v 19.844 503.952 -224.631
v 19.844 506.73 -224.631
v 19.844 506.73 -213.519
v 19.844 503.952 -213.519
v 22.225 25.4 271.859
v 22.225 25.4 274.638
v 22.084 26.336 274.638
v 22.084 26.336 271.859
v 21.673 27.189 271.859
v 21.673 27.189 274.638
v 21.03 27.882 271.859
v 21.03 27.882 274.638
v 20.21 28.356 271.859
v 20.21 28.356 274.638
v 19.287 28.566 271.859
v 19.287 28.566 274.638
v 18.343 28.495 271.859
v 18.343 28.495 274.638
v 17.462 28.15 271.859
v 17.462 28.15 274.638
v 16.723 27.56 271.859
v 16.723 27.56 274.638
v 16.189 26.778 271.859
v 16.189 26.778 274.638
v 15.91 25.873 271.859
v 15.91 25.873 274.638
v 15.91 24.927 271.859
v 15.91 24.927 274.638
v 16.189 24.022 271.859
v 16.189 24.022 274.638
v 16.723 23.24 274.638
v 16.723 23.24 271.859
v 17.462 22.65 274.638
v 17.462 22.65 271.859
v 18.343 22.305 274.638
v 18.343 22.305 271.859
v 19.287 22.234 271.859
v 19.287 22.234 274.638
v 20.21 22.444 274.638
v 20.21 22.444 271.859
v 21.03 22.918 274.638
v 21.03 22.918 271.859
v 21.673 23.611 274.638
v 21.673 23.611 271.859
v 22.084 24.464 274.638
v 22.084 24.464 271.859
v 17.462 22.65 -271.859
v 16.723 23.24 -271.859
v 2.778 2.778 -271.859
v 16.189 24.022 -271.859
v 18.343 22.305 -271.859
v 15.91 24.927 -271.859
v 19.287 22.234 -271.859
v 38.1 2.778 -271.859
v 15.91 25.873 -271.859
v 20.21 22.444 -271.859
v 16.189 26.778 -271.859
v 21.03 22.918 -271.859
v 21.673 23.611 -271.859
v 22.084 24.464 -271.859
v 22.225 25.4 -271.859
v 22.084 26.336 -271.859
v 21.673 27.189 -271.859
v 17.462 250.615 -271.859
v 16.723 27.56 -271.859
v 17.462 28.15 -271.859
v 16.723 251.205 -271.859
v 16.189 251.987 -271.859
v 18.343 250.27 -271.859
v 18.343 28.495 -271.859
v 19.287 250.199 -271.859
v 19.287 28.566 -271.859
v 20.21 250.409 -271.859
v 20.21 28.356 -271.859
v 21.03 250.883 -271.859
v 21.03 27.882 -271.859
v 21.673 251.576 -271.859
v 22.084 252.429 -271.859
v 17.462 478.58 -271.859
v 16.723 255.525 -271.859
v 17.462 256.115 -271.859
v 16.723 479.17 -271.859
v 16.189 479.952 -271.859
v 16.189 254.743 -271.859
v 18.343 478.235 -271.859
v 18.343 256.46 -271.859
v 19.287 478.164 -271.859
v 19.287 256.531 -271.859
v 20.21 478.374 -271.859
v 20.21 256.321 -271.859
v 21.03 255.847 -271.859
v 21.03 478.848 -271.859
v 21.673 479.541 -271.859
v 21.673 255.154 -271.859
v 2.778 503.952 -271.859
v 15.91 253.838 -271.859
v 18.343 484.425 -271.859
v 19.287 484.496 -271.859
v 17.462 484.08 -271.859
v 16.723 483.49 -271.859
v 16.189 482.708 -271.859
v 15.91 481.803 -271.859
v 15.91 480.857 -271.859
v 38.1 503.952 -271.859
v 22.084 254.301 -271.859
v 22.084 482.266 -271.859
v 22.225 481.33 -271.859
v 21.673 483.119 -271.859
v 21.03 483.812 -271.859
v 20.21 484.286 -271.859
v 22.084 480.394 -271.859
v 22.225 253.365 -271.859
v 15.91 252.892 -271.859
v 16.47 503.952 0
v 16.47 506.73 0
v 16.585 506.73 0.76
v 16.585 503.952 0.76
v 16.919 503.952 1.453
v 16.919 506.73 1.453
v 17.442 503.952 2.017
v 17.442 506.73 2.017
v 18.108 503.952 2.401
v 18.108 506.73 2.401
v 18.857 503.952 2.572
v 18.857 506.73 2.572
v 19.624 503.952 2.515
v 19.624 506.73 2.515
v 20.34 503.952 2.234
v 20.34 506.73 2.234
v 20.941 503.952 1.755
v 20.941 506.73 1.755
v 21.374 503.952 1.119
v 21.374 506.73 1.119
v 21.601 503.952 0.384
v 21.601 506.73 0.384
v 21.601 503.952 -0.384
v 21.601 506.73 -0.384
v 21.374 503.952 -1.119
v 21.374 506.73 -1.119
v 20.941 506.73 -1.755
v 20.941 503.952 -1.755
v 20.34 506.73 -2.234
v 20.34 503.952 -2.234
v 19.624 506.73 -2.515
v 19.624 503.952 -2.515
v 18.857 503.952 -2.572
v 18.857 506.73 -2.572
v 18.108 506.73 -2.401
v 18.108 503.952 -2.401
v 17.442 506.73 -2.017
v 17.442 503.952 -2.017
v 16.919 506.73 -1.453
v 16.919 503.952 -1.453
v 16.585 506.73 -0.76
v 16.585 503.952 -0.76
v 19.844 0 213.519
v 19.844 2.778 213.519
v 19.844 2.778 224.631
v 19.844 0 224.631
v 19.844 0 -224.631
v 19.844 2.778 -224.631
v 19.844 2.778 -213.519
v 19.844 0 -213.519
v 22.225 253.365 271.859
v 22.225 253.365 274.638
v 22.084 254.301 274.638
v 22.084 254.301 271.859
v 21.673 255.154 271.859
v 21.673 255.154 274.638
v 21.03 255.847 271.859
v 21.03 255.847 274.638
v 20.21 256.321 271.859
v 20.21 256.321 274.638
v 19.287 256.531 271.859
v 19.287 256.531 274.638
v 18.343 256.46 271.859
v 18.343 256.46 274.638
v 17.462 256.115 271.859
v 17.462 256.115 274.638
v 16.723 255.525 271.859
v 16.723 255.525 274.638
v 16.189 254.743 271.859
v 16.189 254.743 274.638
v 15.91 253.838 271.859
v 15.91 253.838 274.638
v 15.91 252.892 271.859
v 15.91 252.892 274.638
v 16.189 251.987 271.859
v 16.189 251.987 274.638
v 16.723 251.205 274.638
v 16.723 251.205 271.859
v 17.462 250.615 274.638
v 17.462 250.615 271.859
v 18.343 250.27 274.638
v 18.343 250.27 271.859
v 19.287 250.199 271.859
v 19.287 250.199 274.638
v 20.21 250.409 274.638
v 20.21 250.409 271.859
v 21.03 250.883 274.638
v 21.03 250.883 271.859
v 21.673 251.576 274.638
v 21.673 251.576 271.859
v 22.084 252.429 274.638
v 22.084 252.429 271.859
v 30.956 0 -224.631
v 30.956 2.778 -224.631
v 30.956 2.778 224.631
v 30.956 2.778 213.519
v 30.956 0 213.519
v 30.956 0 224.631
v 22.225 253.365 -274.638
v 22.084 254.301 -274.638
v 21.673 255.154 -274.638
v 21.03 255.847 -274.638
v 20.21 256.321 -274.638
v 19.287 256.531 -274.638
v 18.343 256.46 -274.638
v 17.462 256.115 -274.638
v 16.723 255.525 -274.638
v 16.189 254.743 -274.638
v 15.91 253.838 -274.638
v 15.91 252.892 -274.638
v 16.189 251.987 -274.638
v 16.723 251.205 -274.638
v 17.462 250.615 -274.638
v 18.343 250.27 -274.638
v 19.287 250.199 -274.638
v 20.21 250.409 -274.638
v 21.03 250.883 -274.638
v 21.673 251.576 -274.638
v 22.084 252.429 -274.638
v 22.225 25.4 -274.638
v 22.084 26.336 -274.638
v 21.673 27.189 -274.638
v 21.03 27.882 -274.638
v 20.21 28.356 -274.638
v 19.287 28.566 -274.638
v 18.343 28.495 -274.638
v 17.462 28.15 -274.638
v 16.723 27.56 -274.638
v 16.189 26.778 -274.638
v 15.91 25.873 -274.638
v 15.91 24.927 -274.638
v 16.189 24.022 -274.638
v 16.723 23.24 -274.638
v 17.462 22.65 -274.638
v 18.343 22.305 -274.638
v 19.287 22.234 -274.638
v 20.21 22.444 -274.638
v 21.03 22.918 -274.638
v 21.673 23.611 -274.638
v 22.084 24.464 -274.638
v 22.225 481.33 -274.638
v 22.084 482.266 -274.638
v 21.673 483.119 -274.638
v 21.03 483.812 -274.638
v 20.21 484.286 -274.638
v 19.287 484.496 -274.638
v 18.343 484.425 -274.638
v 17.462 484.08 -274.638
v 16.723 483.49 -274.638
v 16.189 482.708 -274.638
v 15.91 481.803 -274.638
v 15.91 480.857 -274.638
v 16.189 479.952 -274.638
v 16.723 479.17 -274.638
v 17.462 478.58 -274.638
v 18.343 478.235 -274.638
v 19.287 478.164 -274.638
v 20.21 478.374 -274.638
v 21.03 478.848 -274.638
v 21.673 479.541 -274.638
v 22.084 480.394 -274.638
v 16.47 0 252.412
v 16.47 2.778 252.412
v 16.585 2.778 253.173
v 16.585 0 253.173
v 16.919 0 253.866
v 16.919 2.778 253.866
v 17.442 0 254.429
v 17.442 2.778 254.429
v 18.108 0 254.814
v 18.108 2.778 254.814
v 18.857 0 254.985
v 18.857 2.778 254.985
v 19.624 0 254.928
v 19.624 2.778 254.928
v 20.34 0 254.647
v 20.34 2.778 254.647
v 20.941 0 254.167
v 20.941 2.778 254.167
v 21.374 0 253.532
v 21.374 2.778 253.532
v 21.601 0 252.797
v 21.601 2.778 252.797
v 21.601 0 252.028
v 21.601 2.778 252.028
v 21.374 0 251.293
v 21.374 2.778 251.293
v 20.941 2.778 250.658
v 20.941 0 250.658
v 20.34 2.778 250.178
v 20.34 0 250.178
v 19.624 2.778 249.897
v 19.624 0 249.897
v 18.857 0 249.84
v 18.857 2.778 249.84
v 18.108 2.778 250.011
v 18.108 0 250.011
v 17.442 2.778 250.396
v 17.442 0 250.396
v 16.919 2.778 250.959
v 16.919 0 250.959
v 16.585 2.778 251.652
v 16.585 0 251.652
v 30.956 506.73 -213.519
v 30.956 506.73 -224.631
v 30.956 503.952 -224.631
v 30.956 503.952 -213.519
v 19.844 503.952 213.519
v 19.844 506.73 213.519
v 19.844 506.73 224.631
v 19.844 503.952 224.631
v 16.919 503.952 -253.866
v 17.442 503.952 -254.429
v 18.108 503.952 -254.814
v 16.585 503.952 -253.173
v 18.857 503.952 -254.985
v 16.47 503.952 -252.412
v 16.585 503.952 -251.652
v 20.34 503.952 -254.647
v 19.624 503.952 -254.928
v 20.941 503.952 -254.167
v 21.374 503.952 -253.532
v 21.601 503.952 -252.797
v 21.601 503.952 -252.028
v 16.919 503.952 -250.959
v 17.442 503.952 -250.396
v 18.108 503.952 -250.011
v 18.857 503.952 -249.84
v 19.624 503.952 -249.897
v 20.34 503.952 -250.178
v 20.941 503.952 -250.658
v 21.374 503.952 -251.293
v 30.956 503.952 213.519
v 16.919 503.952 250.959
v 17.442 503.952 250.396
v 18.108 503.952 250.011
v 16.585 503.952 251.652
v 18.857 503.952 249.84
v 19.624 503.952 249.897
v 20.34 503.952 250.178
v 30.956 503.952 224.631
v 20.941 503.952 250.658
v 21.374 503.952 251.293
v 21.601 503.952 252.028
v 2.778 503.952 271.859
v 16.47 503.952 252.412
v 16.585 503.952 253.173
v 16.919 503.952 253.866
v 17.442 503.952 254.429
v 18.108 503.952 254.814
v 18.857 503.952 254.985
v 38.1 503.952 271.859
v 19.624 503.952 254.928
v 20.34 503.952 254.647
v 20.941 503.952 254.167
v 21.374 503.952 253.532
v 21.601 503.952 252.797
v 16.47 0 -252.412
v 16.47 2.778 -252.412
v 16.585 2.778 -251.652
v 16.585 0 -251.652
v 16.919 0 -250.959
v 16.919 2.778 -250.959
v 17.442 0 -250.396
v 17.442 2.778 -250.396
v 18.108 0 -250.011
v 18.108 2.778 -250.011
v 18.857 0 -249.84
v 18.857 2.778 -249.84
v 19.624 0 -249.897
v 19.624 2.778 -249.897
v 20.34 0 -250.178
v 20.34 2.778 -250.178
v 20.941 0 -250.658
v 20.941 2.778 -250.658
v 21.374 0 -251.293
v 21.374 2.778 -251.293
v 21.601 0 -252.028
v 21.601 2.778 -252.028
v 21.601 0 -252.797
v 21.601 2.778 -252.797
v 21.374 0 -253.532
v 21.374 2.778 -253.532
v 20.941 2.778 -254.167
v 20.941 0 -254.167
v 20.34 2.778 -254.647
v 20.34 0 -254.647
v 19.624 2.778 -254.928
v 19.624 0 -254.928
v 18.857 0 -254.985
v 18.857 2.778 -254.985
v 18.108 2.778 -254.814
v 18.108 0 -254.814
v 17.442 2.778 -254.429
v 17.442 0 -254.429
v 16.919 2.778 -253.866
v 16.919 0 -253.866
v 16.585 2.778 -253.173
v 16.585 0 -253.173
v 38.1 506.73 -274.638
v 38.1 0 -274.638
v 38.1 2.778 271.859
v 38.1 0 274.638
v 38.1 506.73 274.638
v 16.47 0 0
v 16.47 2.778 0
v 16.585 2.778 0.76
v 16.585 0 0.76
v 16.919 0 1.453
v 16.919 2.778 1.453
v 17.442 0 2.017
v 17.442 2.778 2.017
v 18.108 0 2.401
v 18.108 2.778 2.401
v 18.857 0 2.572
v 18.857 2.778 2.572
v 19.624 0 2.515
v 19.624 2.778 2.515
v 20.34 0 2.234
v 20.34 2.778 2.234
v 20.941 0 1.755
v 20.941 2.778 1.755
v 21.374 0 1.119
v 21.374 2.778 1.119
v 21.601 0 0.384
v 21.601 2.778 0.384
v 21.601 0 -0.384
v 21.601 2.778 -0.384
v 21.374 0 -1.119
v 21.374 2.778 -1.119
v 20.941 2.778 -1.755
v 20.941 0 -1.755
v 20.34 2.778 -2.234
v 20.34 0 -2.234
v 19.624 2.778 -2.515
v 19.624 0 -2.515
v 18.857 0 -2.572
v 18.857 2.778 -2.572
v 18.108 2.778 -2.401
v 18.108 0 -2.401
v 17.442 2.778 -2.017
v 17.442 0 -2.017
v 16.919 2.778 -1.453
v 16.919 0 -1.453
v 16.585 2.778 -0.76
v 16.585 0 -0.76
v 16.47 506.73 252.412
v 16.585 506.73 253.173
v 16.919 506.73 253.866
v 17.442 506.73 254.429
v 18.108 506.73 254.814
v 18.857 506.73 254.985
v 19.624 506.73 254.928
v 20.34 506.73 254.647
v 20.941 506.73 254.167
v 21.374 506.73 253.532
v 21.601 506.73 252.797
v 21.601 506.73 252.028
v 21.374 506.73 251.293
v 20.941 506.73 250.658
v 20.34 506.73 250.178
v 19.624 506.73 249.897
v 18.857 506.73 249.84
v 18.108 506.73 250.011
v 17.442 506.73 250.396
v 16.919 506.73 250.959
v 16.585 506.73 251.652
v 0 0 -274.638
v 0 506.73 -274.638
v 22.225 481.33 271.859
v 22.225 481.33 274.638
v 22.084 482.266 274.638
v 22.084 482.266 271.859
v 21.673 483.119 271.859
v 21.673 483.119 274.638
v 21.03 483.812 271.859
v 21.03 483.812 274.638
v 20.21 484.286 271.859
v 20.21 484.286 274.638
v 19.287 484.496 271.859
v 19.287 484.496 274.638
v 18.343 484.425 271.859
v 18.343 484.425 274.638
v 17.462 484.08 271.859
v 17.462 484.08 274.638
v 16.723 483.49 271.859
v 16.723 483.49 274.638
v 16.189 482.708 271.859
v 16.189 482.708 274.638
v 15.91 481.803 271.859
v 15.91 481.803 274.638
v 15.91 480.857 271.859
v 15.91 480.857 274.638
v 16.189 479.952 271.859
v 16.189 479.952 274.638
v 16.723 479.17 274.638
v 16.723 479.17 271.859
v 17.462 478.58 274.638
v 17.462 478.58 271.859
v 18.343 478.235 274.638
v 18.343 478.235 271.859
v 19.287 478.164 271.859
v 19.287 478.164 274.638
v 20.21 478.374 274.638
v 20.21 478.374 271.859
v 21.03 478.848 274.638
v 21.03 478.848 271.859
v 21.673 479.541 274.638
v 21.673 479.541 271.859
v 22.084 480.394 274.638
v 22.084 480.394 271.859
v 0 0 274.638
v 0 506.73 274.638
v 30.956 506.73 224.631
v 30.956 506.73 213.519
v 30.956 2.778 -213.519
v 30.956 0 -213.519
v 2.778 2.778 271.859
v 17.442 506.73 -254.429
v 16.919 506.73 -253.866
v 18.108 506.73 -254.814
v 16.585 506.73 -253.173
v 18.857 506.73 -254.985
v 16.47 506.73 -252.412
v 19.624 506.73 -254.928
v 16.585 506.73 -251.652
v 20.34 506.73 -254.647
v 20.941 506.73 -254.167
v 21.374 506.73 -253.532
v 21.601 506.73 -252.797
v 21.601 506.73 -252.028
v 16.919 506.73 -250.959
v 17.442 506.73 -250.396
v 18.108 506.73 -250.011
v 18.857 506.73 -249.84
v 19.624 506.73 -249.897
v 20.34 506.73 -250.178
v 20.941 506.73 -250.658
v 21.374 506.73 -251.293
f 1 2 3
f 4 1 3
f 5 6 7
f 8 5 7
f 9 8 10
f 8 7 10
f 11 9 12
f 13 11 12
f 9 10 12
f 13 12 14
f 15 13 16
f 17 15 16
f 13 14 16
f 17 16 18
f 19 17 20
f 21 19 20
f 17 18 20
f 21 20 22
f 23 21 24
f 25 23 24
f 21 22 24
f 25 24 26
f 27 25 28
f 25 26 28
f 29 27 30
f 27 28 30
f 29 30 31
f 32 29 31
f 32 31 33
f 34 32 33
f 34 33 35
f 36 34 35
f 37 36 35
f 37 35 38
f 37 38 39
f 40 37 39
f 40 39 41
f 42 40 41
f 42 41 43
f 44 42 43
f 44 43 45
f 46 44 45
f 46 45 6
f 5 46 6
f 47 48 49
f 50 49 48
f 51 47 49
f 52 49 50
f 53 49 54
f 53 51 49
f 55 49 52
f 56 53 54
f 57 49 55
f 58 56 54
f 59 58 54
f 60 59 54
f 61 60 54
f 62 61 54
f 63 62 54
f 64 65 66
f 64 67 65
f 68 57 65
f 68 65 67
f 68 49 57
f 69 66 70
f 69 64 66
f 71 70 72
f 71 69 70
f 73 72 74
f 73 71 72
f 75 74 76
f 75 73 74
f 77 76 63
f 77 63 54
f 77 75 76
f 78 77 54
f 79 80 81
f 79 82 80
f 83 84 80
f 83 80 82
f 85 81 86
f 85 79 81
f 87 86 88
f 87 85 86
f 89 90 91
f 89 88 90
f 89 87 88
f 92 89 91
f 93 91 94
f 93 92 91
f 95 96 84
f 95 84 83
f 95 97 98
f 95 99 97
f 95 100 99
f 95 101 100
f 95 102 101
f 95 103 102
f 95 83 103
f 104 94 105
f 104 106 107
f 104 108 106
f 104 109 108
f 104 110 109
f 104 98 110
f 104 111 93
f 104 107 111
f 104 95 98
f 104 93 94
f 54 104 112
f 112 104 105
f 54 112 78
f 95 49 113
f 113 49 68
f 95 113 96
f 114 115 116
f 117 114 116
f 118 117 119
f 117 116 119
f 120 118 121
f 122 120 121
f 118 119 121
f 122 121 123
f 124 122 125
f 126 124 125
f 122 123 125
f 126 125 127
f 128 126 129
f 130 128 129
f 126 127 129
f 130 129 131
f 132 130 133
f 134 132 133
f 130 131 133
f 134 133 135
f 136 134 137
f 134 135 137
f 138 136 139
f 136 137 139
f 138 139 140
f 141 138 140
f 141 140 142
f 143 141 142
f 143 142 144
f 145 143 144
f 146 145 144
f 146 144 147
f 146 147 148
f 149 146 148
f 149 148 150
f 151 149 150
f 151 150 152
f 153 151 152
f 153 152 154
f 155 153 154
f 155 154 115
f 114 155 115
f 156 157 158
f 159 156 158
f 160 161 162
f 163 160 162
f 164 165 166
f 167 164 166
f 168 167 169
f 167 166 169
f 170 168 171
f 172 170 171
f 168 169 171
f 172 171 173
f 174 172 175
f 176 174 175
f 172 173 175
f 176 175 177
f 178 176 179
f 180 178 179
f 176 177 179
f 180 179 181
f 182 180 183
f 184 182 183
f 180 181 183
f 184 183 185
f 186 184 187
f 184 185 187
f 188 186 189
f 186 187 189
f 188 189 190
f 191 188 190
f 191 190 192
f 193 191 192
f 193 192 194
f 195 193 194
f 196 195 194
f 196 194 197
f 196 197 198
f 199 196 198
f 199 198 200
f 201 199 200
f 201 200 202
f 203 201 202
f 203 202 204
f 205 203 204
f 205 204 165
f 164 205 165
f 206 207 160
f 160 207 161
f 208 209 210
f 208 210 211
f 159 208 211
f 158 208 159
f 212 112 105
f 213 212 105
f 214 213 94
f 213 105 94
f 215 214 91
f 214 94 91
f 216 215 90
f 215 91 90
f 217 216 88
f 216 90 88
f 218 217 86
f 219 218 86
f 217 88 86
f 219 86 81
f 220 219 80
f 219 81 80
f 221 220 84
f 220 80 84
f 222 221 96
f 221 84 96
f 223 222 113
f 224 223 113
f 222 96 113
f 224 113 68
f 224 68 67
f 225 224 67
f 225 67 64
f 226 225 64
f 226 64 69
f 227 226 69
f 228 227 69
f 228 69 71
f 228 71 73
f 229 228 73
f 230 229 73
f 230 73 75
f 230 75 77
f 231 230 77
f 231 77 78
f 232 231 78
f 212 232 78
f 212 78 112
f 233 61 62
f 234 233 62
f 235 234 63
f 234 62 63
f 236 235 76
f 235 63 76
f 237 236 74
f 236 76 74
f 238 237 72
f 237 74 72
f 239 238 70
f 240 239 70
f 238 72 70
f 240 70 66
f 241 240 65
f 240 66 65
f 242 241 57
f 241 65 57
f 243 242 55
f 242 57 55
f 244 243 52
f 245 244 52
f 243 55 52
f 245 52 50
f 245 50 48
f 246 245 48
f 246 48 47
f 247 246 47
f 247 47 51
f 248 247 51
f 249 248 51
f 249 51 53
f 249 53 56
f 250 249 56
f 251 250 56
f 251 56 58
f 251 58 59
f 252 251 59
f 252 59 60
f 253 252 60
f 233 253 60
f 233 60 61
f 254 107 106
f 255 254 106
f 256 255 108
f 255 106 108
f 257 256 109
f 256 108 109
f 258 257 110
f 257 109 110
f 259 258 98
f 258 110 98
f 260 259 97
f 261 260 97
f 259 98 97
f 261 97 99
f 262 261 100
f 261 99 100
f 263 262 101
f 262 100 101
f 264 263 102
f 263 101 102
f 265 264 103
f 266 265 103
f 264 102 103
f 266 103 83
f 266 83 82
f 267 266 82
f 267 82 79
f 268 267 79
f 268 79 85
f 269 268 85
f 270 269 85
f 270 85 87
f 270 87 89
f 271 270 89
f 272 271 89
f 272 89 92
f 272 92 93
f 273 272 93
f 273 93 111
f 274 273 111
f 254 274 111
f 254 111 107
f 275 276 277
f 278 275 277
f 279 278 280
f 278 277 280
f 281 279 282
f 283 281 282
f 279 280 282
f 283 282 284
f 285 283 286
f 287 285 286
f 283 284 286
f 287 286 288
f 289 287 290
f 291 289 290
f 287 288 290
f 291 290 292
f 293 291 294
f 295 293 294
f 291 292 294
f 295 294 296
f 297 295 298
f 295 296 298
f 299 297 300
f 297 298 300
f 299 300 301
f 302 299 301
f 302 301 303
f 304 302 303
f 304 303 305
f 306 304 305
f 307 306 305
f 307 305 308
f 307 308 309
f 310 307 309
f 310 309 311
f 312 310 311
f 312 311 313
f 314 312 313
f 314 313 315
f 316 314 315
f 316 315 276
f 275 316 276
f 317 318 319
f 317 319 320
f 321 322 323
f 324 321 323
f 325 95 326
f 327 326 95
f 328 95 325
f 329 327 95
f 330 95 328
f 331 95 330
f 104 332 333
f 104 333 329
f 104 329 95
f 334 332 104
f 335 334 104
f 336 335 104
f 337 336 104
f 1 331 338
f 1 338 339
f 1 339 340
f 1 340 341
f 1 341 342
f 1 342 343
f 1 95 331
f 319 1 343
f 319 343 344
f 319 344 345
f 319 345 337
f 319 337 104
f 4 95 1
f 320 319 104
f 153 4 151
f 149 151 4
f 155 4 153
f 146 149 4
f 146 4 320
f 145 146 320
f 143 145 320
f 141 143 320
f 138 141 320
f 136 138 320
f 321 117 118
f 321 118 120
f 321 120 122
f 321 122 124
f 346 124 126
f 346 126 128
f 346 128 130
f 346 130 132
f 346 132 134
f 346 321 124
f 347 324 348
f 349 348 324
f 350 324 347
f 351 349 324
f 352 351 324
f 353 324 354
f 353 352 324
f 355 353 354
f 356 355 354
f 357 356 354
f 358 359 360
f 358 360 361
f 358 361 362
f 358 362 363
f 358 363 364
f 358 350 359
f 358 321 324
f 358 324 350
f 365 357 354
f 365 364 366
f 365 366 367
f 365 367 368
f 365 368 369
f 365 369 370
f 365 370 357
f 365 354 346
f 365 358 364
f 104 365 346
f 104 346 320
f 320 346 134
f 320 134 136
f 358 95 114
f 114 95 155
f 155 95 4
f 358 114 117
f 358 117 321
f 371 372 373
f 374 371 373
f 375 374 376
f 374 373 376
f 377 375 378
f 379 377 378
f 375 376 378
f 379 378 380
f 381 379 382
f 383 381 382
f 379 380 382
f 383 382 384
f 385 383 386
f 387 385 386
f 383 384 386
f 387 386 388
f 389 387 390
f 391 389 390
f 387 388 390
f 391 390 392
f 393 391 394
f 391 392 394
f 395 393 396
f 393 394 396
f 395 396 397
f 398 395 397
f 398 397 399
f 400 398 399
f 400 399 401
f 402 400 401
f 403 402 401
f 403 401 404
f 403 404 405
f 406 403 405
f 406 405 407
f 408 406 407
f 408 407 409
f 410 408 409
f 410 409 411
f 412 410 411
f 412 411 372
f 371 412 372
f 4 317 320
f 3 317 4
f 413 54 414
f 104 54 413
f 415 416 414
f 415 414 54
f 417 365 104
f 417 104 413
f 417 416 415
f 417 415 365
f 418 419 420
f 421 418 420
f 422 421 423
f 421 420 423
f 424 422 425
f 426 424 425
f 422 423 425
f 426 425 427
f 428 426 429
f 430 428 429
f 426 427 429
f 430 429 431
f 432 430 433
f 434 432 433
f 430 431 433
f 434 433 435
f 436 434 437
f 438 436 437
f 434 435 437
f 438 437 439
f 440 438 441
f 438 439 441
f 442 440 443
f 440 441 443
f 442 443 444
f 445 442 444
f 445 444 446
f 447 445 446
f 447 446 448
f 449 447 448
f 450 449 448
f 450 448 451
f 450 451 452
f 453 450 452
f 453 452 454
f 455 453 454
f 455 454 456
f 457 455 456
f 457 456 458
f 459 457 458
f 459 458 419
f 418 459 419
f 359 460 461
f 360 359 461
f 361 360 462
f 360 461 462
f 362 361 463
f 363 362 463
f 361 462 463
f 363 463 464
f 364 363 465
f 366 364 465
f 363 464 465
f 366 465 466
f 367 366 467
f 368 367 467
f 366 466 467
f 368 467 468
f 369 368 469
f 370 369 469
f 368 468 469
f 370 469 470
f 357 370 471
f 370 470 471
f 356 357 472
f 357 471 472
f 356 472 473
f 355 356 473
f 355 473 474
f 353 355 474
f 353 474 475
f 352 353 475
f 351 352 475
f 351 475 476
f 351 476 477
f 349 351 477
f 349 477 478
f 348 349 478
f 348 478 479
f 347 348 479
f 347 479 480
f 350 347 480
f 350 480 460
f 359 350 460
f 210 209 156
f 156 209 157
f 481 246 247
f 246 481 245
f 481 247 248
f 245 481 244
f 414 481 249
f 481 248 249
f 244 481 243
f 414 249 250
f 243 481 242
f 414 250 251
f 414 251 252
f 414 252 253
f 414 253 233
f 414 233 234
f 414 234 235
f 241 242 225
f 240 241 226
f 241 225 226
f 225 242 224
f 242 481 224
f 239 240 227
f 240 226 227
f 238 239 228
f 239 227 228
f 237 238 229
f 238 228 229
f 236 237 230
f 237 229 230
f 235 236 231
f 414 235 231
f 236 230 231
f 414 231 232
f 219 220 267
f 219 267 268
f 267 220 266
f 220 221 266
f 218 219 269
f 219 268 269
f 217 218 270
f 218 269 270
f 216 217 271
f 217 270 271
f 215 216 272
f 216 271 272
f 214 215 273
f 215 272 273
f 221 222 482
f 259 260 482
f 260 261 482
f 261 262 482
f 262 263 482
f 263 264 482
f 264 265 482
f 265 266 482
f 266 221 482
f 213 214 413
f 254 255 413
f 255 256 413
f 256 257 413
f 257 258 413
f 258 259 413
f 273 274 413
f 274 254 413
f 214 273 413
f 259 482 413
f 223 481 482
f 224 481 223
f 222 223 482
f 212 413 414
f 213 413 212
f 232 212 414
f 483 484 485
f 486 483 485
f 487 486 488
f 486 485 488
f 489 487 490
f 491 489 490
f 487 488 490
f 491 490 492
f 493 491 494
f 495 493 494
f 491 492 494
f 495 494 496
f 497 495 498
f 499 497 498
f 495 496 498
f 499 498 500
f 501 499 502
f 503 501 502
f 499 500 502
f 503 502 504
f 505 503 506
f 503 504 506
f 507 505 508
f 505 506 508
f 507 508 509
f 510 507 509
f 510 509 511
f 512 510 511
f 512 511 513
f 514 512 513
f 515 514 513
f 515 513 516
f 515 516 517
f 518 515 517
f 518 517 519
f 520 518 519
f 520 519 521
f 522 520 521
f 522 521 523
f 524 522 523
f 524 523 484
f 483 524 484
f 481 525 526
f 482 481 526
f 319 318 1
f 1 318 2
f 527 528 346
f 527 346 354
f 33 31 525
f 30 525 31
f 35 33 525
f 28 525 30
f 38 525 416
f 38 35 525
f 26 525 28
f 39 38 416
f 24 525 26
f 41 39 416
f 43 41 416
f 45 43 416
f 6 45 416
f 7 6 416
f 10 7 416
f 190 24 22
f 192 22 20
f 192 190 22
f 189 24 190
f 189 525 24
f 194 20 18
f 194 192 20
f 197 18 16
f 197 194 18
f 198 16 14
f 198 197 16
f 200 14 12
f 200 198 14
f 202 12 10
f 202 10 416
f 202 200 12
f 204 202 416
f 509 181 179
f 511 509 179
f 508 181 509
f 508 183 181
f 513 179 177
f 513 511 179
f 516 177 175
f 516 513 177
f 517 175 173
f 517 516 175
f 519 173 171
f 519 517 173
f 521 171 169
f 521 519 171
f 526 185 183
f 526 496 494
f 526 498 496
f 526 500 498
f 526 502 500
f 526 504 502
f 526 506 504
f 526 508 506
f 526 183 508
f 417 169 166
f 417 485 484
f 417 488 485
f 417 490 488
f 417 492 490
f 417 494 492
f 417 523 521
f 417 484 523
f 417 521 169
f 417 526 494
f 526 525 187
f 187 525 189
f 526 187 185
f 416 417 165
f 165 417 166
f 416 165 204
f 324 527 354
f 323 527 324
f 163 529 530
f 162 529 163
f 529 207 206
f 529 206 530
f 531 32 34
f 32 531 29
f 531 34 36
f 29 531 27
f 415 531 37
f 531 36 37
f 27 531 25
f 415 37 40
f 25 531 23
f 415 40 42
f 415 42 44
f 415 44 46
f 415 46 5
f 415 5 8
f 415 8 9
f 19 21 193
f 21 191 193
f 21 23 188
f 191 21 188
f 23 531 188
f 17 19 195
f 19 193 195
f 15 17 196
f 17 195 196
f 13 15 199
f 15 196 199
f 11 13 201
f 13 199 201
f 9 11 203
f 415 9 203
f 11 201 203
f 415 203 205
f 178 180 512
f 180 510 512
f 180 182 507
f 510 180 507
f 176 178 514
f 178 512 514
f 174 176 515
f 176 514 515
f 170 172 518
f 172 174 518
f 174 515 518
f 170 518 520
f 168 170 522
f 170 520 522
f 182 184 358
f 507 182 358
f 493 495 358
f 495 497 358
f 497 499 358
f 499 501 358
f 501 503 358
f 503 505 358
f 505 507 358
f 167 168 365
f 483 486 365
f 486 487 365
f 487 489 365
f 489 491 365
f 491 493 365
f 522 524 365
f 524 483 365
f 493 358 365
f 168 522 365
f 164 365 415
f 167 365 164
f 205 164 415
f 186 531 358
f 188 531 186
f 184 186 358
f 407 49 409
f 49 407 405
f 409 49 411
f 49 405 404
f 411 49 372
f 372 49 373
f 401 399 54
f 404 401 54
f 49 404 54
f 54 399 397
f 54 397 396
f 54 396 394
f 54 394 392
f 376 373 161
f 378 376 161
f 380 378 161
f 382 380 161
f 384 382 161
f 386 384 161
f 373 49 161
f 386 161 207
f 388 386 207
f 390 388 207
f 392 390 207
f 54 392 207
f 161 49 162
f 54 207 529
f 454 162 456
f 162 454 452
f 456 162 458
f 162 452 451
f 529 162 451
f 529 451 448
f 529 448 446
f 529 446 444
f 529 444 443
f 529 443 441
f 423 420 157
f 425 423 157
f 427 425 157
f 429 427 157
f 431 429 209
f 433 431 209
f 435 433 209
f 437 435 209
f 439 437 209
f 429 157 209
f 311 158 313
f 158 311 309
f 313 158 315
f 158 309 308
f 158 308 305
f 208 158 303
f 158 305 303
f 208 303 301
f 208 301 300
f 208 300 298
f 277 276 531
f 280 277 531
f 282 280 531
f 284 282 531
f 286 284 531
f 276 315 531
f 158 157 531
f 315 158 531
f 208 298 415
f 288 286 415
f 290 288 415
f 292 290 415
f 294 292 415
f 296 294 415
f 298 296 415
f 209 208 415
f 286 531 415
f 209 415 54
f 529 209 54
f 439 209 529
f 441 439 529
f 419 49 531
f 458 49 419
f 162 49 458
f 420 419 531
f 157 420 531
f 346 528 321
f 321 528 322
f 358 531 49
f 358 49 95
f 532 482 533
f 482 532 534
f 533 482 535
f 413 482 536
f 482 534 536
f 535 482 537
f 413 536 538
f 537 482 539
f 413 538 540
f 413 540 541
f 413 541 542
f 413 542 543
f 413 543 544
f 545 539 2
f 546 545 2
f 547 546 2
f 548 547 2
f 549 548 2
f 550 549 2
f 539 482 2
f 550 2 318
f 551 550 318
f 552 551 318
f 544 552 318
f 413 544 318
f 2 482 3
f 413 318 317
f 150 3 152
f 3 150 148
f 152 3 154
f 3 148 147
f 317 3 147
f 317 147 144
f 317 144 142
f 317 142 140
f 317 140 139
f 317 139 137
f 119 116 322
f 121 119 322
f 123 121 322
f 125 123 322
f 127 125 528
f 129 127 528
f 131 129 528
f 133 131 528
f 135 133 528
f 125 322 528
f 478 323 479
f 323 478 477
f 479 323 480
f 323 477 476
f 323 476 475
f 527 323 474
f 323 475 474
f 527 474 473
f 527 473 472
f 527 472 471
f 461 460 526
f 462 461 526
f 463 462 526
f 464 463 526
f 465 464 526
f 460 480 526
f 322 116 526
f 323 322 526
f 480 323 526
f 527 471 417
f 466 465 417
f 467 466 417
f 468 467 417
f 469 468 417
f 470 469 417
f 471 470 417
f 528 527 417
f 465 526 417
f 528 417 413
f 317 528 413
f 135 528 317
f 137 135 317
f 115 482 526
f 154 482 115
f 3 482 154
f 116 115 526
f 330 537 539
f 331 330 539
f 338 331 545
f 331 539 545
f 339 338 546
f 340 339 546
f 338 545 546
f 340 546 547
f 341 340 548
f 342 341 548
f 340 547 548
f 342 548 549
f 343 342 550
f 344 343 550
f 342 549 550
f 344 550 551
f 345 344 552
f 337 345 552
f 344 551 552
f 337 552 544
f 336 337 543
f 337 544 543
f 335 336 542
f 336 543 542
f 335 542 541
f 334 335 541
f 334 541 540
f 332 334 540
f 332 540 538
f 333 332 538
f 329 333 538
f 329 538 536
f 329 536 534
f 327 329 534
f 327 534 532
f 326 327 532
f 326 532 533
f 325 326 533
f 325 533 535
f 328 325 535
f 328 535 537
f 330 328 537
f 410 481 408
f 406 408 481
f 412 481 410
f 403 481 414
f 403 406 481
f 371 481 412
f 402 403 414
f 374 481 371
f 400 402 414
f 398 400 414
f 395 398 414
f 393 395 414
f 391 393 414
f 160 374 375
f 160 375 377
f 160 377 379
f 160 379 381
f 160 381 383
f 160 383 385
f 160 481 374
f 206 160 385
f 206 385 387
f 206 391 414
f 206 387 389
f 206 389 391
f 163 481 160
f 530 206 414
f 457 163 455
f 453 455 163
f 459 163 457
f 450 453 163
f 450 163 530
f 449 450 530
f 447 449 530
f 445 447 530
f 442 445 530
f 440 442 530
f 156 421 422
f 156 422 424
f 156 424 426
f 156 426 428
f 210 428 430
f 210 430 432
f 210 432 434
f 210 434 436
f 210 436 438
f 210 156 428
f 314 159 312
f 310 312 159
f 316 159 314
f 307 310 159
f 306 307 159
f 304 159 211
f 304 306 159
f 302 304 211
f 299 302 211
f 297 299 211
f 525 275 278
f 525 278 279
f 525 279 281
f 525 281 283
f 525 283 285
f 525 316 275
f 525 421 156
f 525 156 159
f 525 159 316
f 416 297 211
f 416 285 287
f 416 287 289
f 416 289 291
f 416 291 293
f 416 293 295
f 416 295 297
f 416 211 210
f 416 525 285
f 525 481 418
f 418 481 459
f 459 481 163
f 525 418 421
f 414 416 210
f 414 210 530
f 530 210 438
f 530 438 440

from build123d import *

# Parameters (mm, degrees)
F0_W     = 38.1
F0_H     = 506.73
F1_DEPTH = 274.6375
F2_T     = -2.778125
F3_R     = 2.5796875
F3_W     = 11.1125
F3_H     = 11.1125
F4_DEPTH = 506.731
F5_R     = 3.175
F6_DEPTH = 549.276


# Not quite as in the source:
# - a feature names something its author has since deleted; it is built from what else it names


with BuildPart() as f1:
    # F0 (on Top) → F1 (new body, symmetric)
    with BuildSketch(Plane.XY):
        with Locations((19.05, 253.365)):
            Rectangle(F0_W, F0_H)
    extrude(amount=F1_DEPTH, both=True)

    # F2
    f2_openings = [f1.faces().sort_by_distance(p)[0] for p in [
        (38.1, 253.365, 0),
    ]]
    offset(amount=F2_T, openings=f2_openings)

    # F3 (on face) → F4 (cut, through all)
    with BuildSketch(Plane(origin=(0, 506.73, 0), x_dir=(-1, 0, 0), z_dir=(0, 1, 0))):
        with Locations((-19.05, 252.4125)):
            Circle(F3_R)
        with Locations((-19.05, 0)):
            Circle(F3_R)
        with Locations((-19.05, -252.4125)):
            Circle(F3_R)
        with Locations((-25.4, 219.075)):
            Rectangle(F3_W, F3_H)
        with Locations((-25.4, -219.075)):
            Rectangle(F3_W, F3_H)
    extrude(amount=-F4_DEPTH, mode=Mode.SUBTRACT)

    # F5 (on face) → F6 (cut, through all)
    with BuildSketch(Plane.XY.offset(274.6375)):
        with Locations((19.05, 481.33)):
            Circle(F5_R)
        with Locations((19.05, 253.365)):
            Circle(F5_R)
        with Locations((19.05, 25.4)):
            Circle(F5_R)
    extrude(amount=-F6_DEPTH, mode=Mode.SUBTRACT)


solid = f1.part
